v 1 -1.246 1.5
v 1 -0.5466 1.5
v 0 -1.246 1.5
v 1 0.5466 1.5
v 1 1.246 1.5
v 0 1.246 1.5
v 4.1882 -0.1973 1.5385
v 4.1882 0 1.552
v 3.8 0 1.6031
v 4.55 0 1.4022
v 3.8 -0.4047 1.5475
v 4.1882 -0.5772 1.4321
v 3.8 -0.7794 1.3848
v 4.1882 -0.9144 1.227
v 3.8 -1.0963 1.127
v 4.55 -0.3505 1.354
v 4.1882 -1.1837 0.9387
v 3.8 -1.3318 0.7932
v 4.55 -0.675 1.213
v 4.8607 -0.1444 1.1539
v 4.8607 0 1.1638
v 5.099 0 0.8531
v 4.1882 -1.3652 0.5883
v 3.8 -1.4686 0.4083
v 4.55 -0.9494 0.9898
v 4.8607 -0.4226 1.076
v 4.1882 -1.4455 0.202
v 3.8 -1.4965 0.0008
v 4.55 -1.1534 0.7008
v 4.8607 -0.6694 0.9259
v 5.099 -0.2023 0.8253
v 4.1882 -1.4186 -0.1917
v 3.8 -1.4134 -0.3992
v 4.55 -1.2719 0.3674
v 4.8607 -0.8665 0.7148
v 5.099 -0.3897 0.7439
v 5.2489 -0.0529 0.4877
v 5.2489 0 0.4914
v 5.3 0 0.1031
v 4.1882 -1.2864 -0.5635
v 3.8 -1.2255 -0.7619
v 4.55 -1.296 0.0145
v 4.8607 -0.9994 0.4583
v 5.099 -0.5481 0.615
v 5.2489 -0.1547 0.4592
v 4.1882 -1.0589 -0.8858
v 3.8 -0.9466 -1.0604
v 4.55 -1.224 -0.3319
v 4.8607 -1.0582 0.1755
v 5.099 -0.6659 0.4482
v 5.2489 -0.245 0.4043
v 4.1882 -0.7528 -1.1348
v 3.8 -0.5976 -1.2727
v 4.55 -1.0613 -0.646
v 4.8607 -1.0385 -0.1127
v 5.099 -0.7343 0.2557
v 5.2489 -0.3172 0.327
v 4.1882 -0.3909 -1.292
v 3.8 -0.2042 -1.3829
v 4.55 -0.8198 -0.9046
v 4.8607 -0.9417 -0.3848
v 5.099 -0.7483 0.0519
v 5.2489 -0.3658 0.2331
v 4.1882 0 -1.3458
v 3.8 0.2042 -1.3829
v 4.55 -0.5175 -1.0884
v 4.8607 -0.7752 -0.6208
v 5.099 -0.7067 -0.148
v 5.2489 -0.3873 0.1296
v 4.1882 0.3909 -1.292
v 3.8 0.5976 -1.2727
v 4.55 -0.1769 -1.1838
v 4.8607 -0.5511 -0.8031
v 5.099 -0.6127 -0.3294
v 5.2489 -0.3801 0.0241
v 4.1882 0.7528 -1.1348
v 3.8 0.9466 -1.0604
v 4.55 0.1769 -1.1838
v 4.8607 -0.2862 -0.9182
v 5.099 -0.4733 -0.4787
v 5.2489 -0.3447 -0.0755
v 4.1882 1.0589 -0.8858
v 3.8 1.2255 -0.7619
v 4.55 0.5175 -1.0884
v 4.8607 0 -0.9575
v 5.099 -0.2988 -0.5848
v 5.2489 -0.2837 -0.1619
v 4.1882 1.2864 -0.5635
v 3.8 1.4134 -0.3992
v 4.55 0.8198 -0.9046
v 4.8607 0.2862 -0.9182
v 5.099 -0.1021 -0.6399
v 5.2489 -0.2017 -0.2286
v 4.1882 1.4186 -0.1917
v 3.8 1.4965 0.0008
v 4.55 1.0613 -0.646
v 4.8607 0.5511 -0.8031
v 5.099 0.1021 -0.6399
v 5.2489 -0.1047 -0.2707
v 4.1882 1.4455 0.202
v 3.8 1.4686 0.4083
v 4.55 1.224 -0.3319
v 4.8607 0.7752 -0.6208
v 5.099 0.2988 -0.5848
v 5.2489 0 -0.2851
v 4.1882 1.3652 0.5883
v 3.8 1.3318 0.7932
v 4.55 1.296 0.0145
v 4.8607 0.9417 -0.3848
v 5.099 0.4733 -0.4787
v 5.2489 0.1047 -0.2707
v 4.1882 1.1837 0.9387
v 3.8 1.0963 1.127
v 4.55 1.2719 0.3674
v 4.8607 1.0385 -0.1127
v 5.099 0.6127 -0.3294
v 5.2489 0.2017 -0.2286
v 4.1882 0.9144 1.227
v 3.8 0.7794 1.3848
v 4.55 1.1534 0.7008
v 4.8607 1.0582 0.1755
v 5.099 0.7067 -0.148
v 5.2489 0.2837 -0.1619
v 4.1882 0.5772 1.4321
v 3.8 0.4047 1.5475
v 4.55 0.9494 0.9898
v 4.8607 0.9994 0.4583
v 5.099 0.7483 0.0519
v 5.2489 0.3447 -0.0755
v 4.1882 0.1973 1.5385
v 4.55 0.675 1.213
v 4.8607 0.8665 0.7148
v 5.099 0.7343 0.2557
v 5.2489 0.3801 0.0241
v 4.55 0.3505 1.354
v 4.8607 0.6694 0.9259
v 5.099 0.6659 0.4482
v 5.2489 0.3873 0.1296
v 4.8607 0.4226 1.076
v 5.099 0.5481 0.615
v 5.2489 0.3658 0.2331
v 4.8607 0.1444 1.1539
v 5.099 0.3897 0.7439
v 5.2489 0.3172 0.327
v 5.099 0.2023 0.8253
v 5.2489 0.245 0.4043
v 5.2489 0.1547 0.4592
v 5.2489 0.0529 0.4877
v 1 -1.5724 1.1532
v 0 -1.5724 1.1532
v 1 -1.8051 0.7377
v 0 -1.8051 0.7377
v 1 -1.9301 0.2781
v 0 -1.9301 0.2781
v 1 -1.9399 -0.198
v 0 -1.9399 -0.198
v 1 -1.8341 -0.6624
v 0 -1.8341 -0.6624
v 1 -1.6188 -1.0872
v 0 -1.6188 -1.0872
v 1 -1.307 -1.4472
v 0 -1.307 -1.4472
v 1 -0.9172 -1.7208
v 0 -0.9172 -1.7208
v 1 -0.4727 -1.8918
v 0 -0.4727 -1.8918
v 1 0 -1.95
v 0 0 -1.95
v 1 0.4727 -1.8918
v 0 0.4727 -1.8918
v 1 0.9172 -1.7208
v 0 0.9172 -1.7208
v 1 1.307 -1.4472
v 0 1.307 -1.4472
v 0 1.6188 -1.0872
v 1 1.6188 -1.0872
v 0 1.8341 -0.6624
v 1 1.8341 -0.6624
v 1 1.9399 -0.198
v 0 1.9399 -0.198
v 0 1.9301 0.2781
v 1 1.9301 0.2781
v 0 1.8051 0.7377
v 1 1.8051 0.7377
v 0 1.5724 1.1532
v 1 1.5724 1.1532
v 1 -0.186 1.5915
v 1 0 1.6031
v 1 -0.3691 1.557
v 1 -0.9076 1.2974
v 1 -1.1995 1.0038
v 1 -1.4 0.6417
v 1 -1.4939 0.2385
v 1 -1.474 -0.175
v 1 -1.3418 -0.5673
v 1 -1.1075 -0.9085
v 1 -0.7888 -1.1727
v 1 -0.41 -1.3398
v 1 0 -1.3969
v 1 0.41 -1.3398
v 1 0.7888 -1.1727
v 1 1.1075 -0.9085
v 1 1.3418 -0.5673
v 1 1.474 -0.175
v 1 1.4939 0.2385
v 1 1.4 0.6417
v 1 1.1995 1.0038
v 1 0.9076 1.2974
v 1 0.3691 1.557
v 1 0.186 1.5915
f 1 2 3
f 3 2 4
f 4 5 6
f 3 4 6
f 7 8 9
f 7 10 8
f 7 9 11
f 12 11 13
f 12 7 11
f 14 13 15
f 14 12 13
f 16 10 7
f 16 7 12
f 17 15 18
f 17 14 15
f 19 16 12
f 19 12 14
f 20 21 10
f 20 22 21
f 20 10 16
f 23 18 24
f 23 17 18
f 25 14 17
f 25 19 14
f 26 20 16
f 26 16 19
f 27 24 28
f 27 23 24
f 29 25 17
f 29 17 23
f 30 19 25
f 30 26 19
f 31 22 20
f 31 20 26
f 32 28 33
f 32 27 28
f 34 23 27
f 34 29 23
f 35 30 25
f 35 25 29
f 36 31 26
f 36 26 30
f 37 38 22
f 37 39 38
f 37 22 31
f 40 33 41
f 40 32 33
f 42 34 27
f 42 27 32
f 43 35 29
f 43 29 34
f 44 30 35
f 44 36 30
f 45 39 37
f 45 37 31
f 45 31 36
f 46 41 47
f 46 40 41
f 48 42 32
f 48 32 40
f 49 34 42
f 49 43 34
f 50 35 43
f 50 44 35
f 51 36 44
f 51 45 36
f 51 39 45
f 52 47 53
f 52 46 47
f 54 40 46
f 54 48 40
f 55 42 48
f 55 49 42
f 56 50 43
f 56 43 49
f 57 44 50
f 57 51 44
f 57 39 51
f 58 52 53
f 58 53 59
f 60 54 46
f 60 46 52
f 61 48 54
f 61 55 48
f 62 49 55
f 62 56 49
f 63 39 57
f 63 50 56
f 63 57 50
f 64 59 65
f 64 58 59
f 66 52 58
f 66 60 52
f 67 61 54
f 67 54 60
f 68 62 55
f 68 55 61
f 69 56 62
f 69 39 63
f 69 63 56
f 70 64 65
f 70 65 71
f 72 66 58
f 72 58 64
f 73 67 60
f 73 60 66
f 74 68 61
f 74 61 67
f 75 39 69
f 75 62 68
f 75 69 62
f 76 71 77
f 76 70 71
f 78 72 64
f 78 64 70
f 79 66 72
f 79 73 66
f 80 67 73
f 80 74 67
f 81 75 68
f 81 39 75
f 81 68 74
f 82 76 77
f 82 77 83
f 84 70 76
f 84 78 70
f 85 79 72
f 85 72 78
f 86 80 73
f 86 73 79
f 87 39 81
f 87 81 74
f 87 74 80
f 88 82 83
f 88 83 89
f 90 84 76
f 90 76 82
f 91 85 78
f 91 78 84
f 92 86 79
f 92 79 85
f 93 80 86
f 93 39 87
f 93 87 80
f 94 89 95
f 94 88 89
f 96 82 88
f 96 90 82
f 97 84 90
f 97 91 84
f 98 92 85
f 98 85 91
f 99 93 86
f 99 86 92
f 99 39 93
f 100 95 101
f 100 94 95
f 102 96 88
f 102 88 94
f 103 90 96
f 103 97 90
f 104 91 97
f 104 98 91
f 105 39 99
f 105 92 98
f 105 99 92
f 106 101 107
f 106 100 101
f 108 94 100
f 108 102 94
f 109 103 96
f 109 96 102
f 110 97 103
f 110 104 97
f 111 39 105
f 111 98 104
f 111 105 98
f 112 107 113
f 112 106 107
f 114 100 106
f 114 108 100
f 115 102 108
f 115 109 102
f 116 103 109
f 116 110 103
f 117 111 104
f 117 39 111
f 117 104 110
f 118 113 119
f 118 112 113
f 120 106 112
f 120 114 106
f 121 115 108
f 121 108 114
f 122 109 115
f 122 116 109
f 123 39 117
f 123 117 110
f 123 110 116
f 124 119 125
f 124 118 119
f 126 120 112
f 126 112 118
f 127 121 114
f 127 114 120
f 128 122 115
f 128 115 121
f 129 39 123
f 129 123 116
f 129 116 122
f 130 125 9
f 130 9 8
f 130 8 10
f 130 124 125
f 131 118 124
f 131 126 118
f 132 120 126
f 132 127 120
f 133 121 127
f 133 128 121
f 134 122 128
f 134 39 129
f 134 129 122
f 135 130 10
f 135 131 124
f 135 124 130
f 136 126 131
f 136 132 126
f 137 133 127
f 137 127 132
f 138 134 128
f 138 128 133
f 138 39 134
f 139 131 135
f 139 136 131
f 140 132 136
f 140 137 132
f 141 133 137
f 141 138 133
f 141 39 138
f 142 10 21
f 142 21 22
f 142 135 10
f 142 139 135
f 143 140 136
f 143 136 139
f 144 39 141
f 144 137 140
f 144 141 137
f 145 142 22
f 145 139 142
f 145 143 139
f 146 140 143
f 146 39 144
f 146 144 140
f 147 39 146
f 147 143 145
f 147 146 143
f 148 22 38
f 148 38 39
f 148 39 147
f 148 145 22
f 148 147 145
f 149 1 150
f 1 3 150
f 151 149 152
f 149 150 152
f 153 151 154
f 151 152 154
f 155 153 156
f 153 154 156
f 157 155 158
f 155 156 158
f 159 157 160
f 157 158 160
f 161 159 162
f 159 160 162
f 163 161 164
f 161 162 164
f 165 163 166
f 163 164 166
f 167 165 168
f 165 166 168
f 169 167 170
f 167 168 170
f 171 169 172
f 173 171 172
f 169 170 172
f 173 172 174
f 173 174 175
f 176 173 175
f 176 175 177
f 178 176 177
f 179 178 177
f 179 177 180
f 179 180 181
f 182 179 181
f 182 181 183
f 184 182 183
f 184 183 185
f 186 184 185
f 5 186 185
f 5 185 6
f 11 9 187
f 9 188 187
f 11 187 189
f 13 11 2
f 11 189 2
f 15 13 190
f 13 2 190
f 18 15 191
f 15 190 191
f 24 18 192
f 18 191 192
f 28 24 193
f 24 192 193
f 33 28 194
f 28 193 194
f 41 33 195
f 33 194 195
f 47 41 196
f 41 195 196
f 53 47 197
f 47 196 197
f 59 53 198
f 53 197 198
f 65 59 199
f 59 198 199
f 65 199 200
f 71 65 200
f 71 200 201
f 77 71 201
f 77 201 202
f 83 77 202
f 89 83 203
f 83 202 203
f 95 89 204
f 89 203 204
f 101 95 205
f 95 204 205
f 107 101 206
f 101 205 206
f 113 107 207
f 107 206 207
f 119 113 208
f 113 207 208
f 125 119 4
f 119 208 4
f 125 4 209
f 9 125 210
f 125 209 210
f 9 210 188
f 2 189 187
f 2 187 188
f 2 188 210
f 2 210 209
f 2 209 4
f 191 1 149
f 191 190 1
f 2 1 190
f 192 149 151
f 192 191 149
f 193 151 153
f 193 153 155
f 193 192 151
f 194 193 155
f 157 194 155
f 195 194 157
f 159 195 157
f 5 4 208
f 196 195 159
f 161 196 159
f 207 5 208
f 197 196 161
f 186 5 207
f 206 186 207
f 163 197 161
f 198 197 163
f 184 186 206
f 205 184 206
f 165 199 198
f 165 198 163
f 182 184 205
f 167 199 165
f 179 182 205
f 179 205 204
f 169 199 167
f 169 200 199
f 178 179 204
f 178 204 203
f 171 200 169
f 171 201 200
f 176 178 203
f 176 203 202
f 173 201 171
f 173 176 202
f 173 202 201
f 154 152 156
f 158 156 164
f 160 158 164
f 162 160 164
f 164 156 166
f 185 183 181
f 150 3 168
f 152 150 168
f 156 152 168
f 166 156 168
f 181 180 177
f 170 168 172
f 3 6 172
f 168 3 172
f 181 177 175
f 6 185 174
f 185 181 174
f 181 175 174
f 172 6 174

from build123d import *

# Parameters (mm, degrees)
SKETCH_1_R          = 1.95
EXTRUDE_1_DEPTH     = 1
SKETCH_2_R          = 1.5
EXTRUDE_2_DEPTH     = 4.3
FILLET_1_R          = 1.5
CUT_EXTRUDE_1_DEPTH = 0.45


with BuildPart() as part:
    # Эскиз1 → Бобышка-Вытянуть1 (new body)
    with BuildSketch(Plane(origin=(0, 0, 0), x_dir=(0, 0, -1), z_dir=(1, 0, 0))):
        Circle(SKETCH_1_R)
    extrude(amount=EXTRUDE_1_DEPTH)

    # Эскиз2 → Бобышка-Вытянуть2 (add)
    with BuildSketch(Plane(origin=(1, 0, 0), x_dir=(0, 0, -1), z_dir=(1, 0, 0))):
        with Locations(Location((-0.103125187, 0, 0), (0, 0, 180))):
            Circle(SKETCH_2_R)
    extrude(amount=EXTRUDE_2_DEPTH)

    # Скругление1
    fillet_1_edges = [part.edges().sort_by_distance(p)[0] for p in [
        (5.3, 0, -1.396874813),
    ]]
    fillet(fillet_1_edges, radius=FILLET_1_R)

    # Эскиз4 → Вырез-Вытянуть1 (cut)
    with BuildSketch(Plane.XY.offset(1.95)):
        Polygon((0, 0), (0, 2.822887507), (1, 2.822887507), (1, 0), (1, -3.256991154), (0, -3.256991154), align=None)
    extrude(amount=-CUT_EXTRUDE_1_DEPTH, mode=Mode.SUBTRACT)


solid = part.part
